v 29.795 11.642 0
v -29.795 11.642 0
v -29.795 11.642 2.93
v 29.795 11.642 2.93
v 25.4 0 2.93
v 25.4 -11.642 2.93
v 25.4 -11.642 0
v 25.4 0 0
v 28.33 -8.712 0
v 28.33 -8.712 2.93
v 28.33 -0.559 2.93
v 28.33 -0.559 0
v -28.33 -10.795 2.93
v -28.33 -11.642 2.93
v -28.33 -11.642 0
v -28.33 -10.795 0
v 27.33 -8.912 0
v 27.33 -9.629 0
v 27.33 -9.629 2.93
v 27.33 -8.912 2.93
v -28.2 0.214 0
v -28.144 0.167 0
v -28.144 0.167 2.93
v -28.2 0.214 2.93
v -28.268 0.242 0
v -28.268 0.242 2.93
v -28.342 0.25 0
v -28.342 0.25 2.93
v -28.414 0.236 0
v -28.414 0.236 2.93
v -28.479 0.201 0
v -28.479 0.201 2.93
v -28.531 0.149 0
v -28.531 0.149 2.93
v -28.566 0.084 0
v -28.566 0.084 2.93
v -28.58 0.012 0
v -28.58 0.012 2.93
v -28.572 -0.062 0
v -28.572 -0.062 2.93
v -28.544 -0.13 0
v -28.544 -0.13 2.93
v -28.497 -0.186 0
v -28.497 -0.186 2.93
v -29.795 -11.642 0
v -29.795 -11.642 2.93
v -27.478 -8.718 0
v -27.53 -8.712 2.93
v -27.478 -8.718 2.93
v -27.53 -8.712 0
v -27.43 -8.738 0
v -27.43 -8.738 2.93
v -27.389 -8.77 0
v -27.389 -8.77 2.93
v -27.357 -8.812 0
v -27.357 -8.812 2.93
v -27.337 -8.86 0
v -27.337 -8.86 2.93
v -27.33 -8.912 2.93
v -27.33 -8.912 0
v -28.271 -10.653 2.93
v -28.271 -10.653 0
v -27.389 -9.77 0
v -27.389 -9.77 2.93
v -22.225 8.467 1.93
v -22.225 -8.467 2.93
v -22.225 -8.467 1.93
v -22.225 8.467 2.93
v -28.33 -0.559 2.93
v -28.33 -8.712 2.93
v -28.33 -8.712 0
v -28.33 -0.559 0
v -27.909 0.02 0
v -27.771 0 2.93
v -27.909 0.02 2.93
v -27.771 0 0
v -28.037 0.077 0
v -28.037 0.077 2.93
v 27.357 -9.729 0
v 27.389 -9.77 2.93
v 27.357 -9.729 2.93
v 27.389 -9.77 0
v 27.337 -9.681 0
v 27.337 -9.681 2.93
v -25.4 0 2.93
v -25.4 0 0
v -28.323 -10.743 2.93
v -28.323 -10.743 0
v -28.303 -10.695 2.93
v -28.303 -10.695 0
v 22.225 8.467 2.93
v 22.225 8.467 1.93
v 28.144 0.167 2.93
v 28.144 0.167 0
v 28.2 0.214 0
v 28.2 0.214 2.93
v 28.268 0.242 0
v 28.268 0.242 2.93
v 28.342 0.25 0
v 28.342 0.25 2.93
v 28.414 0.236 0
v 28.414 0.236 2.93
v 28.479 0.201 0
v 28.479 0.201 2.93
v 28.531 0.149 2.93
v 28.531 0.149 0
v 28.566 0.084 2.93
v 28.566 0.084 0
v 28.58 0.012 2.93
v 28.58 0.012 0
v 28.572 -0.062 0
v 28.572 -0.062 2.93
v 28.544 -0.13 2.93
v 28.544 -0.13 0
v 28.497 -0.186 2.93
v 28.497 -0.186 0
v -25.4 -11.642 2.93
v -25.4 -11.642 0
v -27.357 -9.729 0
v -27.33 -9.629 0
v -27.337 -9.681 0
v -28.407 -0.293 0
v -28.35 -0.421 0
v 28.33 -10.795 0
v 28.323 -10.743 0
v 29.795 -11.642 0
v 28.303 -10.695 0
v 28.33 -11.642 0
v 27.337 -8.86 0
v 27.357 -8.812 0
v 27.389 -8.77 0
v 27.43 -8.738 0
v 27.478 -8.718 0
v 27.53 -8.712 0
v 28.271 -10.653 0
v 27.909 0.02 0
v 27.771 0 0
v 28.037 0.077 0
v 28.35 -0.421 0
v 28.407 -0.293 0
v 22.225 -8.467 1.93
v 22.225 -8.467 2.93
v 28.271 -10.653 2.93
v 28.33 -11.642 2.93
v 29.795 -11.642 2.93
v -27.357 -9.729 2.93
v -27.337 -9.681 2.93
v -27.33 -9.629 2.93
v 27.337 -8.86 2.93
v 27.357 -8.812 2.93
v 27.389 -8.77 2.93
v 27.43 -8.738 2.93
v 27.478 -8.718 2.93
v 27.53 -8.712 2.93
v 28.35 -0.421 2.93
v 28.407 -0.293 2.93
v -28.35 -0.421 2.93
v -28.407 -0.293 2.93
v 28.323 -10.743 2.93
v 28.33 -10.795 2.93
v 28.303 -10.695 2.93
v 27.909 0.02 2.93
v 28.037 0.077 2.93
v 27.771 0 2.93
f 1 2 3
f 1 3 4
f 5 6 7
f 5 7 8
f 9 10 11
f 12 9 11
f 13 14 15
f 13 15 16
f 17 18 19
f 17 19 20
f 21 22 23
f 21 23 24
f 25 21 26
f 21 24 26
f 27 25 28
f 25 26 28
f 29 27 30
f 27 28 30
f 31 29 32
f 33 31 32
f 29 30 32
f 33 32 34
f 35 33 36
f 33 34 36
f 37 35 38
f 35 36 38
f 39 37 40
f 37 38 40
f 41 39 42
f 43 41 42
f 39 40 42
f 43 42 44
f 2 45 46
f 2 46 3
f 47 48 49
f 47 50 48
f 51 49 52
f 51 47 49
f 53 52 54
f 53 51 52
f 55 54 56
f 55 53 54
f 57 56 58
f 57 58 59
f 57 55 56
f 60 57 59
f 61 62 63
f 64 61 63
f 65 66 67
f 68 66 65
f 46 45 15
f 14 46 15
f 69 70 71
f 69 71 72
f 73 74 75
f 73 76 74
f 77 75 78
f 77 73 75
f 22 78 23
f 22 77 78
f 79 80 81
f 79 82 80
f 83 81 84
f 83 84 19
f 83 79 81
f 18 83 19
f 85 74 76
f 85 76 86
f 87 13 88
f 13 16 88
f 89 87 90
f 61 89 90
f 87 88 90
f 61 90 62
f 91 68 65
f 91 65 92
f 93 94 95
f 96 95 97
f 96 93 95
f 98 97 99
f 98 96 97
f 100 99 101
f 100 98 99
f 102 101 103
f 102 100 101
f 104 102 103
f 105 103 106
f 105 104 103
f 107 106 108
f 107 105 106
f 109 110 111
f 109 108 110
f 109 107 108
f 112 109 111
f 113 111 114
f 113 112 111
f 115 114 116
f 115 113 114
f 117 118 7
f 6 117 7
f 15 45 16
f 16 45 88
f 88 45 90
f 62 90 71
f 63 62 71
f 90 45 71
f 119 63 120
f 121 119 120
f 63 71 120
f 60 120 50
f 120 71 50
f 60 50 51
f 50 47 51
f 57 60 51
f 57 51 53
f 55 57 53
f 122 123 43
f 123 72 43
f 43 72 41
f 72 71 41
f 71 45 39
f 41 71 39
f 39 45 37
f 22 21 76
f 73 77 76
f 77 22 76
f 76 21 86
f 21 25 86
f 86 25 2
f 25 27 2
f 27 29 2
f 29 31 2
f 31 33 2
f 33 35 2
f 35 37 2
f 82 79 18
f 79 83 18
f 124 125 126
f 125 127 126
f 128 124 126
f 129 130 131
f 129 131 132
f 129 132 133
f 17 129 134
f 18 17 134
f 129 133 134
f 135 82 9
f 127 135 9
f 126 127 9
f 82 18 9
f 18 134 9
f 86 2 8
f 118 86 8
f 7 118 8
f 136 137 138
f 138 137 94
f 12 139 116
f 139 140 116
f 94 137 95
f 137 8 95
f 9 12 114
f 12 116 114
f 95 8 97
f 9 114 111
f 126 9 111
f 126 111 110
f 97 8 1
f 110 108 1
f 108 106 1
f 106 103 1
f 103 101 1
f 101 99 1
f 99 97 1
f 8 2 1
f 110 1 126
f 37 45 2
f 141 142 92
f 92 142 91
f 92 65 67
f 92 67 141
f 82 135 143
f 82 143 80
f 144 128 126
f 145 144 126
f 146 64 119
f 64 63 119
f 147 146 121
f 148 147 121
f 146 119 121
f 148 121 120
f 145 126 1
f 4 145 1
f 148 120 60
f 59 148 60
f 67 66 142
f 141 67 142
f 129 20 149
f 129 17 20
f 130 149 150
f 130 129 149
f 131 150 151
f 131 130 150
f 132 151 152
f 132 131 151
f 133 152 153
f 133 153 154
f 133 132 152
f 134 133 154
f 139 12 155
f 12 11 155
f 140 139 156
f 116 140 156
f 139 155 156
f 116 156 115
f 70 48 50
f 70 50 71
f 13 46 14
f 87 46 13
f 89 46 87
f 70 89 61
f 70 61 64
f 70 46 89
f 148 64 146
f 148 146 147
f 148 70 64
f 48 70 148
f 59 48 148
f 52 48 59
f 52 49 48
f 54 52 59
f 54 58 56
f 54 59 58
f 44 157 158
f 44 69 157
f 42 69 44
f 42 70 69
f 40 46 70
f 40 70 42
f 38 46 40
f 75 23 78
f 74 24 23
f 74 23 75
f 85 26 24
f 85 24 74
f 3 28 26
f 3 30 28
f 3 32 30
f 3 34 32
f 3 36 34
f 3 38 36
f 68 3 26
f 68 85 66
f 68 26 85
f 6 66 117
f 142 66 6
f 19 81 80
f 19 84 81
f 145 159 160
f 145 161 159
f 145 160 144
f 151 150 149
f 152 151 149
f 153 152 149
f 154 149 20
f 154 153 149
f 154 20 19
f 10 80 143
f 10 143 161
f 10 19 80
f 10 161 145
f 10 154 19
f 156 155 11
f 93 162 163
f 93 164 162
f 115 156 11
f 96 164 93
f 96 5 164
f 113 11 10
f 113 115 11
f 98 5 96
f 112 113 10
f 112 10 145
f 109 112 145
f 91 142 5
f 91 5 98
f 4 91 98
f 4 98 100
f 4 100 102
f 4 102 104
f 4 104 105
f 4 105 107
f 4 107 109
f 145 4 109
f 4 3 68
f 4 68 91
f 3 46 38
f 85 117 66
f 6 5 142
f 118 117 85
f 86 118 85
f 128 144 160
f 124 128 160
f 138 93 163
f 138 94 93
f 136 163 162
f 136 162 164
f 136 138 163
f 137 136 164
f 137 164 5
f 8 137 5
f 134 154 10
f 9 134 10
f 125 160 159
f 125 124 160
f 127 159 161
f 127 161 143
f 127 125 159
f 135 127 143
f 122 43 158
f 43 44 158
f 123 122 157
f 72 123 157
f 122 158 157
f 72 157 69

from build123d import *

# Parameters (mm, degrees)
SKETCH1_W            = 59.589999946
SKETCH1_H            = 23.283333334
BOSS_EXTRUDE1_DEPTH  = 2.929999982
SKETCH2_W            = 2.929999982
SKETCH2_H            = 11.641666667
CUT_EXTRUDE1_DEPTH   = 3.929999982
BOSS_EXTRUDE3_DEPTH  = 2.93
FILLET1_R            = 0.2
SKETCH5_R            = 0.25
CUT_EXTRUDE3_DEPTH   = 3.93
FILLET2_R            = 0.5
FILLET1_OF_MIRROR1_R = 0.2
FILLET2_OF_MIRROR1_R = 0.5
SKETCH3_W            = 44.45
SKETCH3_H            = 16.933333334
CUT_EXTRUDE2_DEPTH   = 1


with BuildPart() as part:
    # Sketch1 → Boss-Extrude1 (new body)
    with BuildSketch(Plane.XY):
        Rectangle(SKETCH1_W, SKETCH1_H)
    extrude(amount=BOSS_EXTRUDE1_DEPTH)

    # Sketch2 → Cut-Extrude1 (cut, through all)
    with BuildSketch(Plane.XY.offset(2.929999982)):
        with Locations((-26.864999991, -5.820833334)):
            Rectangle(SKETCH2_W, SKETCH2_H)
    cut_extrude1 = extrude(amount=-CUT_EXTRUDE1_DEPTH, mode=Mode.SUBTRACT)

    # Sketch4 → Boss-Extrude3 (add)
    with BuildSketch(Plane.XY.offset(2.929999982)):
        Polygon((-27.329999982, -8.711666685), (-28.329999982, -8.711666685), (-28.329999982, -10.711666685), (-27.329999982, -9.711666685), align=None)
    boss_extrude3 = extrude(amount=-BOSS_EXTRUDE3_DEPTH)

    # Fillet1
    fillet1_edges = [part.edges().sort_by_distance(p)[0] for p in [
        (-27.329999982, -8.711666685, 1.464999982),
        (-28.329999982, -10.711666685, 1.464999982),
        (-27.329999982, -9.711666685, 1.464999982),
    ]]
    fillet(fillet1_edges, radius=FILLET1_R)

    # Sketch5 → Cut-Extrude3 (cut, through all)
    with BuildSketch(Plane.XY.offset(2.929999982)):
        with Locations((-28.329999982, 0)):
            Circle(SKETCH5_R)
    cut_extrude3 = extrude(amount=-CUT_EXTRUDE3_DEPTH, mode=Mode.SUBTRACT)

    # Fillet2
    fillet2_edges = [part.edges().sort_by_distance(p)[0] for p in [
        (-28.079999982, 0, 1.464999991),
        (-28.329999982, -0.25, 1.464999991),
    ]]
    fillet(fillet2_edges, radius=FILLET2_R)

    # Mirror1: Cut-Extrude1, Boss-Extrude3, Cut-Extrude3 across plane
    add(cut_extrude1.mirror(Plane(origin=(0, 0, 0), x_dir=(0, 0, 1), z_dir=(1, 0, 0))), mode=Mode.SUBTRACT)
    add(boss_extrude3.mirror(Plane(origin=(0, 0, 0), x_dir=(0, 0, 1), z_dir=(1, 0, 0))))
    add(cut_extrude3.mirror(Plane(origin=(0, 0, 0), x_dir=(0, 0, 1), z_dir=(1, 0, 0))), mode=Mode.SUBTRACT)

    # Fillet1 of Mirror1
    fillet1_of_mirror1_edges = [part.edges().sort_by_distance(p)[0] for p in [
        (27.329999982, -8.711666685, 1.464999982),
        (28.329999982, -10.711666685, 1.464999982),
        (27.329999982, -9.711666685, 1.464999982),
    ]]
    fillet(fillet1_of_mirror1_edges, radius=FILLET1_OF_MIRROR1_R)

    # Fillet2 of Mirror1
    fillet2_of_mirror1_edges = [part.edges().sort_by_distance(p)[0] for p in [
        (28.079999982, 0, 1.464999991),
        (28.329999982, -0.25, 1.464999991),
    ]]
    fillet(fillet2_of_mirror1_edges, radius=FILLET2_OF_MIRROR1_R)

    # Sketch3 → Cut-Extrude2 (cut)
    with BuildSketch(Plane.XY.offset(2.929999982)):
        Rectangle(SKETCH3_W, SKETCH3_H)
    extrude(amount=-CUT_EXTRUDE2_DEPTH, mode=Mode.SUBTRACT)


solid = part.part
